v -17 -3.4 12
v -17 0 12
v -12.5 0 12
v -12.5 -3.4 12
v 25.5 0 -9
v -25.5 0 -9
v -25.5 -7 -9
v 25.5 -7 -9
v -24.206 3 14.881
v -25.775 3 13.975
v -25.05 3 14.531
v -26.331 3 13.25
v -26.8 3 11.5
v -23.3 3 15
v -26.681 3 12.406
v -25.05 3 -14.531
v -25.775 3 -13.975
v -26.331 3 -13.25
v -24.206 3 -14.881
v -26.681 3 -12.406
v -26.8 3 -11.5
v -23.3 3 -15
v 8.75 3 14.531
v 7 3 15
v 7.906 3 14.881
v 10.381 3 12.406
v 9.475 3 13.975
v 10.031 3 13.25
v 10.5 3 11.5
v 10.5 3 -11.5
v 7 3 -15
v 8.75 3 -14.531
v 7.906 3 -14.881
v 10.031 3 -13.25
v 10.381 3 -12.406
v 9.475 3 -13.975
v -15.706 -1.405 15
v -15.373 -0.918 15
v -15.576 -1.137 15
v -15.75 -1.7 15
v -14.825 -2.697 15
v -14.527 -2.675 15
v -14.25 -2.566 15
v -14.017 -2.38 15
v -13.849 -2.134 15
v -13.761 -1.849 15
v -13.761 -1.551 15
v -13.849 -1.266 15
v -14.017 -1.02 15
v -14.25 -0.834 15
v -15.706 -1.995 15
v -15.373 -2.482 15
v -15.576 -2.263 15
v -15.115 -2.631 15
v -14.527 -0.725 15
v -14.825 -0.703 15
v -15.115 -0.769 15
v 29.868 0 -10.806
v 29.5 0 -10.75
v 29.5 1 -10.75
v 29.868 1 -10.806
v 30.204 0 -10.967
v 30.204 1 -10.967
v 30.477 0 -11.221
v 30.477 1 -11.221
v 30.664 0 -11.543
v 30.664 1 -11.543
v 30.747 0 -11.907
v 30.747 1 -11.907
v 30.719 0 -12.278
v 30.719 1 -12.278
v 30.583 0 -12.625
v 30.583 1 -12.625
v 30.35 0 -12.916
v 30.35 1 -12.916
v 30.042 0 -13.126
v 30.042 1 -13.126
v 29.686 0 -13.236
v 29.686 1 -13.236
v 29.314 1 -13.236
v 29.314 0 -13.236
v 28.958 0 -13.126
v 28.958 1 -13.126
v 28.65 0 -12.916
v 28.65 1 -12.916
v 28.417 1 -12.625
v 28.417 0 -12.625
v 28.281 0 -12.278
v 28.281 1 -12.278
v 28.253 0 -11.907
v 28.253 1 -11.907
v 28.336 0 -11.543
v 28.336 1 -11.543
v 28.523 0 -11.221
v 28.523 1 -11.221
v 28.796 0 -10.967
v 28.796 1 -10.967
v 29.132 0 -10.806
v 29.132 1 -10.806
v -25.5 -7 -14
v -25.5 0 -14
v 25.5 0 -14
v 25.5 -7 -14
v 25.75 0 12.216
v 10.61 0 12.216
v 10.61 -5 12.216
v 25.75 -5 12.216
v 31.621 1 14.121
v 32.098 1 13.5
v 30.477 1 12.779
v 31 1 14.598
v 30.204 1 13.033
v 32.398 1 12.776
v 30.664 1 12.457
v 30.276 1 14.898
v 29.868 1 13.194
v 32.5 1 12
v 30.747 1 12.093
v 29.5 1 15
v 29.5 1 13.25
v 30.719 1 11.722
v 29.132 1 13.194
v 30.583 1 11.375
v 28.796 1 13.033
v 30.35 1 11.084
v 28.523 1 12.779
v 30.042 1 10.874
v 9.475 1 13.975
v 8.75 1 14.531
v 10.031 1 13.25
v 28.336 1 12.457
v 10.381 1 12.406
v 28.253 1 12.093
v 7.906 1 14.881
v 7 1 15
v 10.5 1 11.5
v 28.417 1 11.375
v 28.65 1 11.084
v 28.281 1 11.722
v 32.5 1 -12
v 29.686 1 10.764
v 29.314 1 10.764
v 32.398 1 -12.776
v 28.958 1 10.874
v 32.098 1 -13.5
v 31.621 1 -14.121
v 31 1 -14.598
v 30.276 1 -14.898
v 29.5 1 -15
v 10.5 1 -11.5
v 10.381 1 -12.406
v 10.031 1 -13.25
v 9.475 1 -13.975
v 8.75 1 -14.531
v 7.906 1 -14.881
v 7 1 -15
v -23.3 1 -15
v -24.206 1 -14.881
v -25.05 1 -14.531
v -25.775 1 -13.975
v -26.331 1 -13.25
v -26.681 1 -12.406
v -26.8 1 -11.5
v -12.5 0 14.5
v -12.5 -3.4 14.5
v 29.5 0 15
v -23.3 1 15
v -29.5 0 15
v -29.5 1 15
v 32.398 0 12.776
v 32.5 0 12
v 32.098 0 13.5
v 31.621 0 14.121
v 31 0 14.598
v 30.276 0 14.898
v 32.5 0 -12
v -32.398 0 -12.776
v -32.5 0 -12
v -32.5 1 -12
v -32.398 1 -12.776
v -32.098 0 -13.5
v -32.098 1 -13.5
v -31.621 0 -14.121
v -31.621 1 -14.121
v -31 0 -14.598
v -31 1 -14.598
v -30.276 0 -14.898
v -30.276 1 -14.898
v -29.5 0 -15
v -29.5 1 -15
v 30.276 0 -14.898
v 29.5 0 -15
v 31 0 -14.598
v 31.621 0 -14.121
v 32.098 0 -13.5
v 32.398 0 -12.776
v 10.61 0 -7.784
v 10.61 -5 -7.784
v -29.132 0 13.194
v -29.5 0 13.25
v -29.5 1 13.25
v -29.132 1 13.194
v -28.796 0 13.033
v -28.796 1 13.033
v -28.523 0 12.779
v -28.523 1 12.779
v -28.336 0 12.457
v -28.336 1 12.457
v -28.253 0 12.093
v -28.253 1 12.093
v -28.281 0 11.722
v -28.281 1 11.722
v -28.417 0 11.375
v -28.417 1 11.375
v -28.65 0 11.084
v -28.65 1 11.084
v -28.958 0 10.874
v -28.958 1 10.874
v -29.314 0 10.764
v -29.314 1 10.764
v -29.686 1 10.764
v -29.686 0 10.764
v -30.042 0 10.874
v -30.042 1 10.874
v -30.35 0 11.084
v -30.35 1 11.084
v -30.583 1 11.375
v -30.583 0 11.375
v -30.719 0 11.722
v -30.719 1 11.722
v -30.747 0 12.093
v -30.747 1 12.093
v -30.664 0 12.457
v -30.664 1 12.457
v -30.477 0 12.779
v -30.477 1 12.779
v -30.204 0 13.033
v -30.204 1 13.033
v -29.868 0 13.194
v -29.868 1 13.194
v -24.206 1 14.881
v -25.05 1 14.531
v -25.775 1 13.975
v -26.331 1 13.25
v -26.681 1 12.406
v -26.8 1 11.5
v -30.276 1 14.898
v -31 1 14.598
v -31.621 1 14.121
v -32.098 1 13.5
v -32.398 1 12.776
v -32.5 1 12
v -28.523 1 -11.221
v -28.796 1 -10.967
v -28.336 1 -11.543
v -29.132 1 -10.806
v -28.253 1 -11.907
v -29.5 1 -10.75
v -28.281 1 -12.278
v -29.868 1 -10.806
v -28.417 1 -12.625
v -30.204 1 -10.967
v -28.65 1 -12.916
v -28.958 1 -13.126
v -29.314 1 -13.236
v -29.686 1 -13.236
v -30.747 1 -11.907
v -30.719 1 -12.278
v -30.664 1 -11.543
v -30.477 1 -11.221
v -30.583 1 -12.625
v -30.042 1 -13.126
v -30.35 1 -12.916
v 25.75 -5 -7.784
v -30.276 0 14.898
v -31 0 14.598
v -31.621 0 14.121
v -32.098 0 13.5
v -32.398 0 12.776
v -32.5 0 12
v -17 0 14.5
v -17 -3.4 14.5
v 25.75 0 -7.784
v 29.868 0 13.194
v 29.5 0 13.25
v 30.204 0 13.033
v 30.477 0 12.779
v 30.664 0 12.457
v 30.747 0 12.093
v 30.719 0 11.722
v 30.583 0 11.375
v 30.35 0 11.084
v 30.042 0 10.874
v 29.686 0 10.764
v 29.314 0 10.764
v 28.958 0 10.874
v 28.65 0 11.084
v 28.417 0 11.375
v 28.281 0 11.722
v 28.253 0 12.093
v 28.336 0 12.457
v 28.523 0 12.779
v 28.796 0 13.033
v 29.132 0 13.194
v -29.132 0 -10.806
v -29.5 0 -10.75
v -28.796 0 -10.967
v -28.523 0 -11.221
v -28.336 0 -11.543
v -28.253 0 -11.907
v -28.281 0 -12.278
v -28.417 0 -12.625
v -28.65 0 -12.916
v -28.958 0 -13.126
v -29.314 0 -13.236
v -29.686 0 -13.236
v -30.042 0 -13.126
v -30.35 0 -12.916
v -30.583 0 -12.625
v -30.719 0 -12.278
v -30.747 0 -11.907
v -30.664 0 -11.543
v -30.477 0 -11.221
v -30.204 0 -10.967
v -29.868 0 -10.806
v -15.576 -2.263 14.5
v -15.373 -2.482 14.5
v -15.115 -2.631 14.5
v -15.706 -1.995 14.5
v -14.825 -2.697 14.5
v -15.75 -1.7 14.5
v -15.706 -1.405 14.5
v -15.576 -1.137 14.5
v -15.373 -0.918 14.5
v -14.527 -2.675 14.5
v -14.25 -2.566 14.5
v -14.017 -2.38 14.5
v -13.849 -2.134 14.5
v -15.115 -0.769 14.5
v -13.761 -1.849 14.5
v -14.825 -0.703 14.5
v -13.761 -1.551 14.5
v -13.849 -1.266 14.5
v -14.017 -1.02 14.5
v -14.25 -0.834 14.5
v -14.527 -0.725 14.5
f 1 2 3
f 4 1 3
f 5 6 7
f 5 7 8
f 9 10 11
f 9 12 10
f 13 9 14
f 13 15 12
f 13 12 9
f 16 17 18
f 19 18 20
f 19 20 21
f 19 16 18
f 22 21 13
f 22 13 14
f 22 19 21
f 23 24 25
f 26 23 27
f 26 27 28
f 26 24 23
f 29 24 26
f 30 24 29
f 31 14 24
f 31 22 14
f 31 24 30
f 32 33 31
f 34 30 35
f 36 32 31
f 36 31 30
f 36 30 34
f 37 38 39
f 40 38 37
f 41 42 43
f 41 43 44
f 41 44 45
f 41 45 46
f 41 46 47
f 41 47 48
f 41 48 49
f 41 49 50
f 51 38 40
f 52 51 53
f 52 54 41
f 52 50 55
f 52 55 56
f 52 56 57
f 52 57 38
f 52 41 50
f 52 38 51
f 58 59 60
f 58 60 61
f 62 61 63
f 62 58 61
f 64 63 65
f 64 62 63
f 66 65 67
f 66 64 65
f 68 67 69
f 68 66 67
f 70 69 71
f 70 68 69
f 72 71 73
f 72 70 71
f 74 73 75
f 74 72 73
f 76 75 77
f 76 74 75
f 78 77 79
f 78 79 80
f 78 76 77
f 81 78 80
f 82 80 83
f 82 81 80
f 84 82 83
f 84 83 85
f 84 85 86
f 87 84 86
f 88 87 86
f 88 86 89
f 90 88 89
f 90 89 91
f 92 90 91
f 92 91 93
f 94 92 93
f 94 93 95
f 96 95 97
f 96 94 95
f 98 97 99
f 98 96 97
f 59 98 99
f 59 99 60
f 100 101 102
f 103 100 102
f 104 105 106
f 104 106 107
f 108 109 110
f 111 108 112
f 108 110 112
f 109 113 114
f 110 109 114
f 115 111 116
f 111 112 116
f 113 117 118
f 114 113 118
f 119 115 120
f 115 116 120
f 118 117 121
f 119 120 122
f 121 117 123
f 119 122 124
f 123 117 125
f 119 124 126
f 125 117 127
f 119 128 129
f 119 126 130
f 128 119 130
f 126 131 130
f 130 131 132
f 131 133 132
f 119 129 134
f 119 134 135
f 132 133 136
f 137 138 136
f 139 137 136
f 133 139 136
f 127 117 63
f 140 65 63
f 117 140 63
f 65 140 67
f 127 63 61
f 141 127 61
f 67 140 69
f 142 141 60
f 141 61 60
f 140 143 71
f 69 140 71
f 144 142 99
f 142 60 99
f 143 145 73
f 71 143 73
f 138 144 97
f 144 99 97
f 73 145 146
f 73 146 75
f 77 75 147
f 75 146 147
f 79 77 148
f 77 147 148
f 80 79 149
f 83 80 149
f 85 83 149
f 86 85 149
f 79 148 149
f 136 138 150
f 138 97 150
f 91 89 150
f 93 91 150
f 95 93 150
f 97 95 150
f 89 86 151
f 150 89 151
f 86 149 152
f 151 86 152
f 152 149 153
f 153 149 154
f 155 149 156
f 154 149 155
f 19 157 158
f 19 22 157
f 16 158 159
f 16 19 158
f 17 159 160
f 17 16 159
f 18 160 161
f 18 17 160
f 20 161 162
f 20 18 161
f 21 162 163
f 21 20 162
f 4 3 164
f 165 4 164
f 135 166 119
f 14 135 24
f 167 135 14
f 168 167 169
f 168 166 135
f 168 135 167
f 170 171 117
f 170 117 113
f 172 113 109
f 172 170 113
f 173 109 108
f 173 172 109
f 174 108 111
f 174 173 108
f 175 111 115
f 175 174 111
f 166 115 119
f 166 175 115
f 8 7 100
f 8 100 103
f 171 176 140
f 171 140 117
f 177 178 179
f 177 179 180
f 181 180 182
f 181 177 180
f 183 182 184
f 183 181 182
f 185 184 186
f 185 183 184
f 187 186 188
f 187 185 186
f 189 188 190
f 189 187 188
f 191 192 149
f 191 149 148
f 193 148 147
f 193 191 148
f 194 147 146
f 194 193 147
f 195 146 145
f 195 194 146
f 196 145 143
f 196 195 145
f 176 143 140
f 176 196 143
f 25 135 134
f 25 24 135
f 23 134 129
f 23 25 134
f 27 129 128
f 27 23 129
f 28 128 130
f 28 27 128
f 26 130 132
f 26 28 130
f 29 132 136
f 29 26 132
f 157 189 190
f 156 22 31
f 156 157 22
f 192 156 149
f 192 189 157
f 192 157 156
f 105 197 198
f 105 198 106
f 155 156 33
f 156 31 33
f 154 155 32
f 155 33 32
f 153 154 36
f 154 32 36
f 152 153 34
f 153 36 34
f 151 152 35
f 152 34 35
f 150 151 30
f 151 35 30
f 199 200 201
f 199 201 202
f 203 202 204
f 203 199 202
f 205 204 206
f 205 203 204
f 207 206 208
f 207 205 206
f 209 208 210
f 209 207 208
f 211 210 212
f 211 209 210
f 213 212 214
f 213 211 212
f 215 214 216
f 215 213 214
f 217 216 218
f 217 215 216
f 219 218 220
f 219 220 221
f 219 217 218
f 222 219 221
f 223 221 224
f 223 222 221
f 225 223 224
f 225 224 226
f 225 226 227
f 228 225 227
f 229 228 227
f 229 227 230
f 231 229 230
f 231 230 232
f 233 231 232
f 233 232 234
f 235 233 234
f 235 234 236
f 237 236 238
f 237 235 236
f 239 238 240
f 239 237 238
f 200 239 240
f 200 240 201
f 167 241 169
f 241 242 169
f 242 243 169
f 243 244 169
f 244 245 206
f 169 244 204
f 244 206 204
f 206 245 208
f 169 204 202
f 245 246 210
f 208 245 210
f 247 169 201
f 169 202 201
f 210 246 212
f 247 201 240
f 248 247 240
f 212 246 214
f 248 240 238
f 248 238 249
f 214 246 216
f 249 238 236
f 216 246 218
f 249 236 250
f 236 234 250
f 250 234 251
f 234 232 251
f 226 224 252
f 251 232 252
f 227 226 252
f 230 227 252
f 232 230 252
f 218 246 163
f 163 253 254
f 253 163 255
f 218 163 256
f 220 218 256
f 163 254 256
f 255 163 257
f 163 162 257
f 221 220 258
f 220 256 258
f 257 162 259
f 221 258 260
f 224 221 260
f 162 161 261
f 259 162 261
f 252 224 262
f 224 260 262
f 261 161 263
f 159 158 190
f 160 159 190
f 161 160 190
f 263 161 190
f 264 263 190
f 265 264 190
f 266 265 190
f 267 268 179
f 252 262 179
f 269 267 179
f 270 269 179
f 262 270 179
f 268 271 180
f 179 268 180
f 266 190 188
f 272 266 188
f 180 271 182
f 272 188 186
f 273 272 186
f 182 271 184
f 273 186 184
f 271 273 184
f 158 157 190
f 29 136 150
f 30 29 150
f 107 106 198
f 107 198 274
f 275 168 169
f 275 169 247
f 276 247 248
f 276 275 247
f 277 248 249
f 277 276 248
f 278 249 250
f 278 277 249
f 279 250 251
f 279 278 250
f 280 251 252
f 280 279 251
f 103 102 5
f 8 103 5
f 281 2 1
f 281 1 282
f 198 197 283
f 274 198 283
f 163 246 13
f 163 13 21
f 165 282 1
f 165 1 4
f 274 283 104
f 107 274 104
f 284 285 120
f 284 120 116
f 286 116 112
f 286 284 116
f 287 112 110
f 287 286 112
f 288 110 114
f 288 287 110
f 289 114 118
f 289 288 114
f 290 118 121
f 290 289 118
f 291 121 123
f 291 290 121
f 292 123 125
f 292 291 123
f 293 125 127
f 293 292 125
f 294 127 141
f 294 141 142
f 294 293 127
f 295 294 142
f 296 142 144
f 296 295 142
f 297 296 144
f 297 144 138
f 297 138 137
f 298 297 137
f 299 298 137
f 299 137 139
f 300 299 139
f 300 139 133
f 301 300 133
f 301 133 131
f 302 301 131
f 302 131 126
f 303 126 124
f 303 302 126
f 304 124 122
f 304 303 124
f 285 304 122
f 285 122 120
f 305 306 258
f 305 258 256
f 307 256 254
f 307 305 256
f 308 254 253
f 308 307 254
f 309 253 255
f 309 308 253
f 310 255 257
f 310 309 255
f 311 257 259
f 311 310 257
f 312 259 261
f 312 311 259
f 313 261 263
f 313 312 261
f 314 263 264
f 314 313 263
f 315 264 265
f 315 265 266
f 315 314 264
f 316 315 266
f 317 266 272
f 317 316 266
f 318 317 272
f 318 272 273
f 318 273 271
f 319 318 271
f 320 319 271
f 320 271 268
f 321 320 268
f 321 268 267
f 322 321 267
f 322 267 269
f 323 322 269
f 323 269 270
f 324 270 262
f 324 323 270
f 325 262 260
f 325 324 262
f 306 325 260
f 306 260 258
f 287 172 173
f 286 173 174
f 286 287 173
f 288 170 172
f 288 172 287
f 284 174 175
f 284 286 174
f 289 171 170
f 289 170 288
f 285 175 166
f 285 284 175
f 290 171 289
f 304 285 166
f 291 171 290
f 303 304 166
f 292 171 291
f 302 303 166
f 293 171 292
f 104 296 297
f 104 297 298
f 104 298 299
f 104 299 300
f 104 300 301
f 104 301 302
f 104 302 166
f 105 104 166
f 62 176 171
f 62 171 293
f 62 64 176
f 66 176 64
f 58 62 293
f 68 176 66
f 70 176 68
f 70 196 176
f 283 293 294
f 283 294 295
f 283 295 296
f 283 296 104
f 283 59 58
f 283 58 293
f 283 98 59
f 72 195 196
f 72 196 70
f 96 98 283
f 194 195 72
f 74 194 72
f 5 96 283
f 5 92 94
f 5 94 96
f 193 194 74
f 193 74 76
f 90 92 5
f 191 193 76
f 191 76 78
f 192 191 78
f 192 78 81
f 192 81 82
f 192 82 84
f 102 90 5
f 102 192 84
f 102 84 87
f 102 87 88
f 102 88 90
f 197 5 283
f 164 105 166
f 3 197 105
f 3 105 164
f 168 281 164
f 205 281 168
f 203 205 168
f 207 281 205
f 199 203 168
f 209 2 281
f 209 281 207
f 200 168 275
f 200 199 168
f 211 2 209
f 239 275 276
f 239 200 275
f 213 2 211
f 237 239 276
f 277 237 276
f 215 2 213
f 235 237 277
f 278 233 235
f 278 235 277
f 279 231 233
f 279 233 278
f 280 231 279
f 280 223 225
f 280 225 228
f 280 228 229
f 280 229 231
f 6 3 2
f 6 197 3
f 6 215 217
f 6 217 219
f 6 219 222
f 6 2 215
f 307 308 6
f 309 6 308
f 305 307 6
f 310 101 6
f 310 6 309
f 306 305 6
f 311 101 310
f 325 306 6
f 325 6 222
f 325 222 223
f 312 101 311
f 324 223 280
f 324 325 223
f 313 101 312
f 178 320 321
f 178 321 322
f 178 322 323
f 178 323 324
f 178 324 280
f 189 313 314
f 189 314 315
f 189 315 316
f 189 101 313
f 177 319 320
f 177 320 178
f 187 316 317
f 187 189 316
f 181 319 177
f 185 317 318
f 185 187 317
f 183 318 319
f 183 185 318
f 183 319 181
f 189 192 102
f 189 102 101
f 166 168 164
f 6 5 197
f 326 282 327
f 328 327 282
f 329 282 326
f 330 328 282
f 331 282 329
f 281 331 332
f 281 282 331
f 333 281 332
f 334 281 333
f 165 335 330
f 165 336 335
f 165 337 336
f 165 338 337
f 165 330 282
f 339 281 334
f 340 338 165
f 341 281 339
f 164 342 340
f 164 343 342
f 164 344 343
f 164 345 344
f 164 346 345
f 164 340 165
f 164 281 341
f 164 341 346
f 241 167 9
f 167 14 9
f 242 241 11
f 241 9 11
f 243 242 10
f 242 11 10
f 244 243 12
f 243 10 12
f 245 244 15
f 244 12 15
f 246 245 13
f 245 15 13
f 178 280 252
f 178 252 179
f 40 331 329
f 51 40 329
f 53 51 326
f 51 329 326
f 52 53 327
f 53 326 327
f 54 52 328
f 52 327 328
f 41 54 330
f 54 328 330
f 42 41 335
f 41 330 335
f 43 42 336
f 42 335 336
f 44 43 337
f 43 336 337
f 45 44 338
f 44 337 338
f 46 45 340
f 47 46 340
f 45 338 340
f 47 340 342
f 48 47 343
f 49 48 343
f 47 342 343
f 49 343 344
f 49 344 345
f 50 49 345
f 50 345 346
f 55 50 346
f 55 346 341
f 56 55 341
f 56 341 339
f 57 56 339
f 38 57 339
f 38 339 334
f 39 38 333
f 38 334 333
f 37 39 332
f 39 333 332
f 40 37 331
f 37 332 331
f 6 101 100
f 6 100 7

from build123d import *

# Parameters (mm, degrees)
SKETCH_1_R       = 1.25
BOARD_DEPTH      = 1
SKETCH_2_W       = 37.3
SKETCH_2_H       = 30
SCREEN_DEPTH     = 2
SCREEN_RADIUS_R  = 3.5
SKETCH_3_W       = 51
SKETCH_3_H       = 5
PLUG_DEPTH       = 7
SKETCH_4_W       = 15.14
SKETCH_4_H       = 20
SPEAKER_DEPTH    = 5
SKETCH_5_W       = 4.5
SKETCH_5_H       = 2.5
BUTTON_DEPTH     = 3.4
SKETCH_6_R       = 1
BUTTON_TAP_DEPTH = 0.5


with BuildPart() as part:
    # 草图1 → board (new body)
    with BuildSketch(Plane(origin=(0, 0, 0), x_dir=(1, 0, 0), z_dir=(0, 1, 0))):
        with BuildLine():
            Line((-29.5, 15), (29.5, 15))
            ThreePointArc((29.5, 15), (31.621320344, 14.121320344), (32.5, 12))
            Line((32.5, 12), (32.5, -12))
            ThreePointArc((32.5, -12), (31.621320344, -14.121320344), (29.5, -15))
            Line((29.5, -15), (-29.5, -15))
            ThreePointArc((-29.5, -15), (-31.621320344, -14.121320344), (-32.5, -12))
            Line((-32.5, -12), (-32.5, 12))
            ThreePointArc((-32.5, 12), (-31.621320344, 14.121320344), (-29.5, 15))
        make_face()
        with Locations(Location((-29.5, 12, 0), (0, 0, 270))):
            Circle(SKETCH_1_R, mode=Mode.SUBTRACT)
        with Locations(Location((29.5, 12, 0), (0, 0, 270))):
            Circle(SKETCH_1_R, mode=Mode.SUBTRACT)
        with Locations(Location((-29.5, -12, 0), (0, 0, 270))):
            Circle(SKETCH_1_R, mode=Mode.SUBTRACT)
        with Locations(Location((29.5, -12, 0), (0, 0, 270))):
            Circle(SKETCH_1_R, mode=Mode.SUBTRACT)
    extrude(amount=BOARD_DEPTH)

    # 草图2 → screen (add)
    with BuildSketch(Plane(origin=(0, 1, 0), x_dir=(1, 0, 0), z_dir=(0, 1, 0))):
        with Locations((-8.15, 0)):
            Rectangle(SKETCH_2_W, SKETCH_2_H)
    extrude(amount=SCREEN_DEPTH)

    # screen-radius
    screen_radius_edges = [part.edges().sort_by_distance(p)[0] for p in [
        (-26.8, 2, -15),
        (-26.8, 2, 15),
        (10.5, 2, 15),
        (10.5, 2, -15),
    ]]
    fillet(screen_radius_edges, radius=SCREEN_RADIUS_R)

    # 草图3 → plug (add)
    with BuildSketch(Plane.XZ):
        with Locations((0, -11.5)):
            Rectangle(SKETCH_3_W, SKETCH_3_H)
    extrude(amount=PLUG_DEPTH)

    # 草图4 → speaker (add)
    with BuildSketch(Plane.XZ):
        with Locations((18.18, 2.216190629)):
            Rectangle(SKETCH_4_W, SKETCH_4_H)
    extrude(amount=SPEAKER_DEPTH)

    # 草图5 → button (add)
    with BuildSketch(Plane.XZ):
        with Locations((-14.75, 13.25)):
            Rectangle(SKETCH_5_W, SKETCH_5_H)
    extrude(amount=BUTTON_DEPTH)

    # 草图6 → button-tap (add)
    with BuildSketch(Plane.XY.offset(14.5)):
        with Locations(Location((-14.75, -1.7, 0), (0, 0, 180))):
            Circle(SKETCH_6_R)
    extrude(amount=BUTTON_TAP_DEPTH)


solid = part.part
